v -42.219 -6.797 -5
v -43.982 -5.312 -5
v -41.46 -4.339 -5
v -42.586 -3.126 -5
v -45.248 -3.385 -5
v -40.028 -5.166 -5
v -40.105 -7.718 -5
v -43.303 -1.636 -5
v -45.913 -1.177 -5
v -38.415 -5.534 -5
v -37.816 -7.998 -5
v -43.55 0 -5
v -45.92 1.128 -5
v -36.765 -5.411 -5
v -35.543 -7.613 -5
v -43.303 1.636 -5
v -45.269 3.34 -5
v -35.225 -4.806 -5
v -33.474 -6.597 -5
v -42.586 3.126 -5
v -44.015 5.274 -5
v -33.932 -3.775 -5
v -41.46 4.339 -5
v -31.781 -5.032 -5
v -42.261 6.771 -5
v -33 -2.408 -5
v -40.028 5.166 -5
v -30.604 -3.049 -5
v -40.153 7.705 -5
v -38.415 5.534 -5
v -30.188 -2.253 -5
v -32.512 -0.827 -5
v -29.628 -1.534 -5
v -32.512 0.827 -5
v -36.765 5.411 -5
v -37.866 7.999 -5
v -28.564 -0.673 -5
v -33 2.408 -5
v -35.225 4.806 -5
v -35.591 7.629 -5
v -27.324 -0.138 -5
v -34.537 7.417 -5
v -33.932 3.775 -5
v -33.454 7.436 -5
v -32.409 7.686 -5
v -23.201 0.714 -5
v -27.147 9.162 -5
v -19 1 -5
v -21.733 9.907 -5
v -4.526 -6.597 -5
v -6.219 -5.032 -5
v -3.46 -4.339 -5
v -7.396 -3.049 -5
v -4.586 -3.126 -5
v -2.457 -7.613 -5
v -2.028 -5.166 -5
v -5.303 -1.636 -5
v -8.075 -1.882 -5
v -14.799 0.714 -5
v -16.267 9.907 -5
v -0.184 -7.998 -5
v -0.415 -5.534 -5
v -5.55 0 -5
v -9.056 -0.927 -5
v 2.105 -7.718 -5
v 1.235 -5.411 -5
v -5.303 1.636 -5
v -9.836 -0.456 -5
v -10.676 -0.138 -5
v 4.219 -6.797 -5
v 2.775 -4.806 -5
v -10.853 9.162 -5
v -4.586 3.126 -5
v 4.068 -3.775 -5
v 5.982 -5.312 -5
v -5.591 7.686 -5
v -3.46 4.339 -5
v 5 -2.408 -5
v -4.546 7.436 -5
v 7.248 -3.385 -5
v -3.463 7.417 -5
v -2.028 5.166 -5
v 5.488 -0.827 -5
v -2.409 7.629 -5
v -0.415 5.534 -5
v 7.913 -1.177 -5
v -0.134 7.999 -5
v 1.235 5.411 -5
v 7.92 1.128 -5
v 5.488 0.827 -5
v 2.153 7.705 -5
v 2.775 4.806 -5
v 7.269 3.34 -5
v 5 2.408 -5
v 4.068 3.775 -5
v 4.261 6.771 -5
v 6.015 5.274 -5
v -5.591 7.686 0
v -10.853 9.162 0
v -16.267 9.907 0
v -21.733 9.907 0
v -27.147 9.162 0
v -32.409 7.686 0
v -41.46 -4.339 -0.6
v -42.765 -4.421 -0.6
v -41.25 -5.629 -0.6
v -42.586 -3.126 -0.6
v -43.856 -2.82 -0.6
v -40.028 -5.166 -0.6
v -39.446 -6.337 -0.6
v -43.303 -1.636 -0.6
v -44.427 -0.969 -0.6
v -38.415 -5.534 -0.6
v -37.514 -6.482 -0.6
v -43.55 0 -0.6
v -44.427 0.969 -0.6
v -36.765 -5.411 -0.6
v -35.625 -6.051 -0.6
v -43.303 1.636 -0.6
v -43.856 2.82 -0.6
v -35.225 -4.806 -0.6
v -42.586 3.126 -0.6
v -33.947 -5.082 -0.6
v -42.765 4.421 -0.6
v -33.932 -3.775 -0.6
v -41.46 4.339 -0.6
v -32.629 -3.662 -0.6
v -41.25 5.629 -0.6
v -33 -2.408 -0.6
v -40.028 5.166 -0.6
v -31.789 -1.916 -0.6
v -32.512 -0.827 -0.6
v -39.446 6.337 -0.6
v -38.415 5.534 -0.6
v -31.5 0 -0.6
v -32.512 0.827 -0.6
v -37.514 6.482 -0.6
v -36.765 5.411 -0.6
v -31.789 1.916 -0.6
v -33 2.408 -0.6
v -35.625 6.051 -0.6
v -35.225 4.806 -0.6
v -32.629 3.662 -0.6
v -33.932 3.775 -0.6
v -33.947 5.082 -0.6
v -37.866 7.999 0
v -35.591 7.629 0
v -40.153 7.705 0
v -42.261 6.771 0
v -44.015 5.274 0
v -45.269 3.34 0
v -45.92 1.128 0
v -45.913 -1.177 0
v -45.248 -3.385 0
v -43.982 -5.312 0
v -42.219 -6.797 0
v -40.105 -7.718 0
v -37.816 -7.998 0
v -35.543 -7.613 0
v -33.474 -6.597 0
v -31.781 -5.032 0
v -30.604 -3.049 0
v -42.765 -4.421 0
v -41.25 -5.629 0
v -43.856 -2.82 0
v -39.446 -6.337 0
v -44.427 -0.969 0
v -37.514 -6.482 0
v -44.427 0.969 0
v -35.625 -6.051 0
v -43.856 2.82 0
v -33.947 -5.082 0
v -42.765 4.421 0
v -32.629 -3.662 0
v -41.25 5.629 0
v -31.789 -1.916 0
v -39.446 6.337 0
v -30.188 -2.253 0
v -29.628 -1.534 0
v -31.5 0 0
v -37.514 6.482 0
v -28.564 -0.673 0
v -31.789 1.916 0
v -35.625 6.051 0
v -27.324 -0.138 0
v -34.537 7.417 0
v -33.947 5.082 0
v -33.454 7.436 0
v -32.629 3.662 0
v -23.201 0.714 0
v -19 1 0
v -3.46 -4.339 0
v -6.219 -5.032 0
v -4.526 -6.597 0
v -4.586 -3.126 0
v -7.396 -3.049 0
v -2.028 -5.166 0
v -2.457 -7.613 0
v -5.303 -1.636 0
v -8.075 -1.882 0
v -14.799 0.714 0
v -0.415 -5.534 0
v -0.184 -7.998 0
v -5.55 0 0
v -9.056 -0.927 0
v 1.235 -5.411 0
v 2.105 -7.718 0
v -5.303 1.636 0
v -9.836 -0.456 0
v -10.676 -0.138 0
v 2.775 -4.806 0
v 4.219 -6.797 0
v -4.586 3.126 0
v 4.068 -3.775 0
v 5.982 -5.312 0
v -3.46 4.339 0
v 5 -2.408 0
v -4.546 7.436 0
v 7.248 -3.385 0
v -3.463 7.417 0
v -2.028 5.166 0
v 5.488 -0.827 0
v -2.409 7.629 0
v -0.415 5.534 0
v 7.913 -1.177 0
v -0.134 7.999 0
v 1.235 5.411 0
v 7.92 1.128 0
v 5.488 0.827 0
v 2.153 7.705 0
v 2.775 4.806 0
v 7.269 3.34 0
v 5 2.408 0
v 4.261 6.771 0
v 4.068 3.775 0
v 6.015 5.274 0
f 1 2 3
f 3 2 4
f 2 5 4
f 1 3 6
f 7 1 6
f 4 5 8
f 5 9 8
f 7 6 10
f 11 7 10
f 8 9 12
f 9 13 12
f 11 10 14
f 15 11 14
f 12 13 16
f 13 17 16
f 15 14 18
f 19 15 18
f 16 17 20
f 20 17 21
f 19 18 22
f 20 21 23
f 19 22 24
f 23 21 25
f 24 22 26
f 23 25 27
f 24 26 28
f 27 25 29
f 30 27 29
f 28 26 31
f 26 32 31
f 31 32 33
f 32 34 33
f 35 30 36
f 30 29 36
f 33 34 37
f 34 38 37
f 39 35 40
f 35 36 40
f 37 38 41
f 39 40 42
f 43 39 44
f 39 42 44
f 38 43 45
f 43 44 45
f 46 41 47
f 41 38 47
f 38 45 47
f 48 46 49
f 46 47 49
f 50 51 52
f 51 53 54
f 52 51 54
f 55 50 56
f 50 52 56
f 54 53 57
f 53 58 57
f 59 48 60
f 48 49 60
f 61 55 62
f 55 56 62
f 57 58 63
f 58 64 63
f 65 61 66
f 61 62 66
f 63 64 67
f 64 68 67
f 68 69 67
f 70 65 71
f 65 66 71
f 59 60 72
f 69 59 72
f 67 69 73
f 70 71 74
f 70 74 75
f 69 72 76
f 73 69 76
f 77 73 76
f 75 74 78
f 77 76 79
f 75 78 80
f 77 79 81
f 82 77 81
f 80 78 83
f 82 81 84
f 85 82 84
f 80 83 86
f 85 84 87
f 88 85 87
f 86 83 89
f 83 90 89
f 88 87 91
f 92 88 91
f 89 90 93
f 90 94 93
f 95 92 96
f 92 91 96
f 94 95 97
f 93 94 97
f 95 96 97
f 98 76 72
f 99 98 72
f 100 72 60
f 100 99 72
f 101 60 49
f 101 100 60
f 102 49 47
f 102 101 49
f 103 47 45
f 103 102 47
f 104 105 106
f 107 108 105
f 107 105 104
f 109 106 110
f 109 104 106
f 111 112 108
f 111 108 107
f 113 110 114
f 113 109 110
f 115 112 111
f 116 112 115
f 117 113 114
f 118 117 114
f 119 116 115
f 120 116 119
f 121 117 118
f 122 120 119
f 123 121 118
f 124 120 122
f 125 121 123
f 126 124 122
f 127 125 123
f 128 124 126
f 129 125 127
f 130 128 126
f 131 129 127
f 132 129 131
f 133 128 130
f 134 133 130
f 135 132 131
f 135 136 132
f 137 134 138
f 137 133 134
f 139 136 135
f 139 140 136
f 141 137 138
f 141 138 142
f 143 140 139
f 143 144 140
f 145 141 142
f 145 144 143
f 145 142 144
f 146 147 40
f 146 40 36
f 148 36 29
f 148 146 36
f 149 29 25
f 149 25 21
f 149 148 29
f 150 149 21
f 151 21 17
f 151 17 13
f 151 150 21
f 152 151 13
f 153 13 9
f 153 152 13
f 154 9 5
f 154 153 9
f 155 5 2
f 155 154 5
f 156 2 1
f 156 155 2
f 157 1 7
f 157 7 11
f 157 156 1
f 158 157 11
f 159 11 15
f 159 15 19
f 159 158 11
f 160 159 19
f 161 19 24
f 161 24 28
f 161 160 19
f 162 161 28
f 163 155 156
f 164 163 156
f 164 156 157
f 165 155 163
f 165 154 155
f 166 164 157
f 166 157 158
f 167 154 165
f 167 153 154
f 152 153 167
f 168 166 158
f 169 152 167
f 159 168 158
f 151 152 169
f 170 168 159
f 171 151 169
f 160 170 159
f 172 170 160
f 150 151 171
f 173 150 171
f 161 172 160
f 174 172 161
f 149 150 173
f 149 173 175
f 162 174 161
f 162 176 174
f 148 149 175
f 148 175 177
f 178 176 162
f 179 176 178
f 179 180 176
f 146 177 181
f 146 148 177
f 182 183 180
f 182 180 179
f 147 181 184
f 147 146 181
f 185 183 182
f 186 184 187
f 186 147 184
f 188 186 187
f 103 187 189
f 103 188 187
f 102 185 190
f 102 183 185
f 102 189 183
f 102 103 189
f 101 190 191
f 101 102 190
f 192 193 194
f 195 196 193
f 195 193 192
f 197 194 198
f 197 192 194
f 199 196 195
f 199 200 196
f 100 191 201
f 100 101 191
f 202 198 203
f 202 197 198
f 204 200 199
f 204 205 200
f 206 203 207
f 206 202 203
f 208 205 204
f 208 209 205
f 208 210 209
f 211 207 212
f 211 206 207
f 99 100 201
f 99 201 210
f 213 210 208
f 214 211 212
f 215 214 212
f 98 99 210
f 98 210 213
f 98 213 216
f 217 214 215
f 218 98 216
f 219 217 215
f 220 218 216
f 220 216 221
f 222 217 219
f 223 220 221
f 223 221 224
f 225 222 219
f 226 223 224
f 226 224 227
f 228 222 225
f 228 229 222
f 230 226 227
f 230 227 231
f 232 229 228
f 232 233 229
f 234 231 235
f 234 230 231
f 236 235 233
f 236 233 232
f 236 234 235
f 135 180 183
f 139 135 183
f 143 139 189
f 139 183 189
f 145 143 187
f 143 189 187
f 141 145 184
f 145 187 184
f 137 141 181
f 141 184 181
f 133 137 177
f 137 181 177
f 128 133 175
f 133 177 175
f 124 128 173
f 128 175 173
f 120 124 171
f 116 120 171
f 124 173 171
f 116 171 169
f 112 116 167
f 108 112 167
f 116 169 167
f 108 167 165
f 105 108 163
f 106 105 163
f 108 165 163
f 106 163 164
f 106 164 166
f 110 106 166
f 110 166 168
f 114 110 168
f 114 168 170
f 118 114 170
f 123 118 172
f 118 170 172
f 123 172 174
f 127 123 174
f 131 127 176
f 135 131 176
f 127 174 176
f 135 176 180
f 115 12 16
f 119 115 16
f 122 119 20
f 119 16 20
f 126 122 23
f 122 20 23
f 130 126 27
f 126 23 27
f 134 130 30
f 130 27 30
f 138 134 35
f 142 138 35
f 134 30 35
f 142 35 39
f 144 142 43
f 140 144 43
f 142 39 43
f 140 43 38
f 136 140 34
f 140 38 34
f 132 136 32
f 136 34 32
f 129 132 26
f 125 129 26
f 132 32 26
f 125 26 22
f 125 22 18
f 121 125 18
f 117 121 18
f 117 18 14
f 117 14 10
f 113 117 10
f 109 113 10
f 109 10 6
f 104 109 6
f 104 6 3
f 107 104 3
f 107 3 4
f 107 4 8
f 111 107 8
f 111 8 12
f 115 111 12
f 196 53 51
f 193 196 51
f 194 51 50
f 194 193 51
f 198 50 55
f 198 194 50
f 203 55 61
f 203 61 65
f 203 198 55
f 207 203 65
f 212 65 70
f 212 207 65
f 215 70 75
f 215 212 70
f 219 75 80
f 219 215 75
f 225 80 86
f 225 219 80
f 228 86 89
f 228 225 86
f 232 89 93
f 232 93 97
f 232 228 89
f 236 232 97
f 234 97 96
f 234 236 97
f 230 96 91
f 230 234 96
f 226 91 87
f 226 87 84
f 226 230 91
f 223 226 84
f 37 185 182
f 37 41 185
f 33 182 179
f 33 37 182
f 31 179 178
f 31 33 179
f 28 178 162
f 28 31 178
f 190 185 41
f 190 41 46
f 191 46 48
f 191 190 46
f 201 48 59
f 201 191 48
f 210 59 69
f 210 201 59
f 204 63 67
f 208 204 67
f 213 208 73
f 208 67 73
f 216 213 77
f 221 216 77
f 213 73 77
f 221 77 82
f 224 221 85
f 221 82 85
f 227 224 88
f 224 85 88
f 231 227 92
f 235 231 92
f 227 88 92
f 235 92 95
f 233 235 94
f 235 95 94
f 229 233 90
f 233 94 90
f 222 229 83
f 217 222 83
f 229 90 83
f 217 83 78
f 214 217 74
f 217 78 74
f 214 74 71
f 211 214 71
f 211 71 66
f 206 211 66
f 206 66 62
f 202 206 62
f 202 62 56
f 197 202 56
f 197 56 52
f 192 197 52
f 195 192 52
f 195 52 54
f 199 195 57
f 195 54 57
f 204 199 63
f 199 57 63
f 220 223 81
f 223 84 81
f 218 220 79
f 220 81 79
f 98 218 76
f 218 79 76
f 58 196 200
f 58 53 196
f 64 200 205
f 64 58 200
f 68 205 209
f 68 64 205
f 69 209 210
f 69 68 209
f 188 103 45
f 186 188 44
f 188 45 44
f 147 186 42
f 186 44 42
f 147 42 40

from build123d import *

# Parameters (mm, degrees)
EXTRUDE_1_DEPTH     = 5
SKETCH_3_R          = 5.55
CUT_EXTRUDE_1_DEPTH = 5
FILLET_1_R          = 5
SKETCH_4_R          = 6.5
CUT_EXTRUDE_2_DEPTH = 0.6


with BuildPart() as part:
    # 草图1 → 凸台-拉伸1 (new body)
    with BuildSketch(Plane.XY):
        with BuildLine():
            ThreePointArc((-7.931682852, -1.043267527), (7.134318966, -3.619598443), (-3.842383801, 7.016843074))
            ThreePointArc((-3.842383801, 7.016843074), (-19, 10), (-34.157616199, 7.016843074))
            ThreePointArc((-34.157616199, 7.016843074), (-45.134318966, -3.619598443), (-30.068317148, -1.043267527))
            ThreePointArc((-30.068317148, -1.043267527), (-19, 1), (-7.931682852, -1.043267527))
        make_face()
    extrude(amount=-EXTRUDE_1_DEPTH)

    # 草图3 → 切除-拉伸1 (cut)
    with BuildSketch(Plane(origin=(0, 0, -5), x_dir=(-1, 0, 0), z_dir=(0, 0, -1))):
        Circle(SKETCH_3_R)
        with Locations((38, 0)):
            Circle(SKETCH_3_R)
    extrude(amount=-CUT_EXTRUDE_1_DEPTH, mode=Mode.SUBTRACT)

    # 圆角1
    fillet_1_edges = [part.edges().sort_by_distance(p)[0] for p in [
        (-30.068317148, -1.043267527, -2.5),
        (-34.157616199, 7.016843074, -2.5),
        (-3.842383801, 7.016843074, -2.5),
        (-7.931682852, -1.043267527, -2.5),
    ]]
    fillet(fillet_1_edges, radius=FILLET_1_R)

    # 草图4 → 切除-拉伸2 (cut)
    with BuildSketch(Plane.XY):
        with Locations((-38, 0)):
            Circle(SKETCH_4_R)
    extrude(amount=-CUT_EXTRUDE_2_DEPTH, mode=Mode.SUBTRACT)


solid = part.part
